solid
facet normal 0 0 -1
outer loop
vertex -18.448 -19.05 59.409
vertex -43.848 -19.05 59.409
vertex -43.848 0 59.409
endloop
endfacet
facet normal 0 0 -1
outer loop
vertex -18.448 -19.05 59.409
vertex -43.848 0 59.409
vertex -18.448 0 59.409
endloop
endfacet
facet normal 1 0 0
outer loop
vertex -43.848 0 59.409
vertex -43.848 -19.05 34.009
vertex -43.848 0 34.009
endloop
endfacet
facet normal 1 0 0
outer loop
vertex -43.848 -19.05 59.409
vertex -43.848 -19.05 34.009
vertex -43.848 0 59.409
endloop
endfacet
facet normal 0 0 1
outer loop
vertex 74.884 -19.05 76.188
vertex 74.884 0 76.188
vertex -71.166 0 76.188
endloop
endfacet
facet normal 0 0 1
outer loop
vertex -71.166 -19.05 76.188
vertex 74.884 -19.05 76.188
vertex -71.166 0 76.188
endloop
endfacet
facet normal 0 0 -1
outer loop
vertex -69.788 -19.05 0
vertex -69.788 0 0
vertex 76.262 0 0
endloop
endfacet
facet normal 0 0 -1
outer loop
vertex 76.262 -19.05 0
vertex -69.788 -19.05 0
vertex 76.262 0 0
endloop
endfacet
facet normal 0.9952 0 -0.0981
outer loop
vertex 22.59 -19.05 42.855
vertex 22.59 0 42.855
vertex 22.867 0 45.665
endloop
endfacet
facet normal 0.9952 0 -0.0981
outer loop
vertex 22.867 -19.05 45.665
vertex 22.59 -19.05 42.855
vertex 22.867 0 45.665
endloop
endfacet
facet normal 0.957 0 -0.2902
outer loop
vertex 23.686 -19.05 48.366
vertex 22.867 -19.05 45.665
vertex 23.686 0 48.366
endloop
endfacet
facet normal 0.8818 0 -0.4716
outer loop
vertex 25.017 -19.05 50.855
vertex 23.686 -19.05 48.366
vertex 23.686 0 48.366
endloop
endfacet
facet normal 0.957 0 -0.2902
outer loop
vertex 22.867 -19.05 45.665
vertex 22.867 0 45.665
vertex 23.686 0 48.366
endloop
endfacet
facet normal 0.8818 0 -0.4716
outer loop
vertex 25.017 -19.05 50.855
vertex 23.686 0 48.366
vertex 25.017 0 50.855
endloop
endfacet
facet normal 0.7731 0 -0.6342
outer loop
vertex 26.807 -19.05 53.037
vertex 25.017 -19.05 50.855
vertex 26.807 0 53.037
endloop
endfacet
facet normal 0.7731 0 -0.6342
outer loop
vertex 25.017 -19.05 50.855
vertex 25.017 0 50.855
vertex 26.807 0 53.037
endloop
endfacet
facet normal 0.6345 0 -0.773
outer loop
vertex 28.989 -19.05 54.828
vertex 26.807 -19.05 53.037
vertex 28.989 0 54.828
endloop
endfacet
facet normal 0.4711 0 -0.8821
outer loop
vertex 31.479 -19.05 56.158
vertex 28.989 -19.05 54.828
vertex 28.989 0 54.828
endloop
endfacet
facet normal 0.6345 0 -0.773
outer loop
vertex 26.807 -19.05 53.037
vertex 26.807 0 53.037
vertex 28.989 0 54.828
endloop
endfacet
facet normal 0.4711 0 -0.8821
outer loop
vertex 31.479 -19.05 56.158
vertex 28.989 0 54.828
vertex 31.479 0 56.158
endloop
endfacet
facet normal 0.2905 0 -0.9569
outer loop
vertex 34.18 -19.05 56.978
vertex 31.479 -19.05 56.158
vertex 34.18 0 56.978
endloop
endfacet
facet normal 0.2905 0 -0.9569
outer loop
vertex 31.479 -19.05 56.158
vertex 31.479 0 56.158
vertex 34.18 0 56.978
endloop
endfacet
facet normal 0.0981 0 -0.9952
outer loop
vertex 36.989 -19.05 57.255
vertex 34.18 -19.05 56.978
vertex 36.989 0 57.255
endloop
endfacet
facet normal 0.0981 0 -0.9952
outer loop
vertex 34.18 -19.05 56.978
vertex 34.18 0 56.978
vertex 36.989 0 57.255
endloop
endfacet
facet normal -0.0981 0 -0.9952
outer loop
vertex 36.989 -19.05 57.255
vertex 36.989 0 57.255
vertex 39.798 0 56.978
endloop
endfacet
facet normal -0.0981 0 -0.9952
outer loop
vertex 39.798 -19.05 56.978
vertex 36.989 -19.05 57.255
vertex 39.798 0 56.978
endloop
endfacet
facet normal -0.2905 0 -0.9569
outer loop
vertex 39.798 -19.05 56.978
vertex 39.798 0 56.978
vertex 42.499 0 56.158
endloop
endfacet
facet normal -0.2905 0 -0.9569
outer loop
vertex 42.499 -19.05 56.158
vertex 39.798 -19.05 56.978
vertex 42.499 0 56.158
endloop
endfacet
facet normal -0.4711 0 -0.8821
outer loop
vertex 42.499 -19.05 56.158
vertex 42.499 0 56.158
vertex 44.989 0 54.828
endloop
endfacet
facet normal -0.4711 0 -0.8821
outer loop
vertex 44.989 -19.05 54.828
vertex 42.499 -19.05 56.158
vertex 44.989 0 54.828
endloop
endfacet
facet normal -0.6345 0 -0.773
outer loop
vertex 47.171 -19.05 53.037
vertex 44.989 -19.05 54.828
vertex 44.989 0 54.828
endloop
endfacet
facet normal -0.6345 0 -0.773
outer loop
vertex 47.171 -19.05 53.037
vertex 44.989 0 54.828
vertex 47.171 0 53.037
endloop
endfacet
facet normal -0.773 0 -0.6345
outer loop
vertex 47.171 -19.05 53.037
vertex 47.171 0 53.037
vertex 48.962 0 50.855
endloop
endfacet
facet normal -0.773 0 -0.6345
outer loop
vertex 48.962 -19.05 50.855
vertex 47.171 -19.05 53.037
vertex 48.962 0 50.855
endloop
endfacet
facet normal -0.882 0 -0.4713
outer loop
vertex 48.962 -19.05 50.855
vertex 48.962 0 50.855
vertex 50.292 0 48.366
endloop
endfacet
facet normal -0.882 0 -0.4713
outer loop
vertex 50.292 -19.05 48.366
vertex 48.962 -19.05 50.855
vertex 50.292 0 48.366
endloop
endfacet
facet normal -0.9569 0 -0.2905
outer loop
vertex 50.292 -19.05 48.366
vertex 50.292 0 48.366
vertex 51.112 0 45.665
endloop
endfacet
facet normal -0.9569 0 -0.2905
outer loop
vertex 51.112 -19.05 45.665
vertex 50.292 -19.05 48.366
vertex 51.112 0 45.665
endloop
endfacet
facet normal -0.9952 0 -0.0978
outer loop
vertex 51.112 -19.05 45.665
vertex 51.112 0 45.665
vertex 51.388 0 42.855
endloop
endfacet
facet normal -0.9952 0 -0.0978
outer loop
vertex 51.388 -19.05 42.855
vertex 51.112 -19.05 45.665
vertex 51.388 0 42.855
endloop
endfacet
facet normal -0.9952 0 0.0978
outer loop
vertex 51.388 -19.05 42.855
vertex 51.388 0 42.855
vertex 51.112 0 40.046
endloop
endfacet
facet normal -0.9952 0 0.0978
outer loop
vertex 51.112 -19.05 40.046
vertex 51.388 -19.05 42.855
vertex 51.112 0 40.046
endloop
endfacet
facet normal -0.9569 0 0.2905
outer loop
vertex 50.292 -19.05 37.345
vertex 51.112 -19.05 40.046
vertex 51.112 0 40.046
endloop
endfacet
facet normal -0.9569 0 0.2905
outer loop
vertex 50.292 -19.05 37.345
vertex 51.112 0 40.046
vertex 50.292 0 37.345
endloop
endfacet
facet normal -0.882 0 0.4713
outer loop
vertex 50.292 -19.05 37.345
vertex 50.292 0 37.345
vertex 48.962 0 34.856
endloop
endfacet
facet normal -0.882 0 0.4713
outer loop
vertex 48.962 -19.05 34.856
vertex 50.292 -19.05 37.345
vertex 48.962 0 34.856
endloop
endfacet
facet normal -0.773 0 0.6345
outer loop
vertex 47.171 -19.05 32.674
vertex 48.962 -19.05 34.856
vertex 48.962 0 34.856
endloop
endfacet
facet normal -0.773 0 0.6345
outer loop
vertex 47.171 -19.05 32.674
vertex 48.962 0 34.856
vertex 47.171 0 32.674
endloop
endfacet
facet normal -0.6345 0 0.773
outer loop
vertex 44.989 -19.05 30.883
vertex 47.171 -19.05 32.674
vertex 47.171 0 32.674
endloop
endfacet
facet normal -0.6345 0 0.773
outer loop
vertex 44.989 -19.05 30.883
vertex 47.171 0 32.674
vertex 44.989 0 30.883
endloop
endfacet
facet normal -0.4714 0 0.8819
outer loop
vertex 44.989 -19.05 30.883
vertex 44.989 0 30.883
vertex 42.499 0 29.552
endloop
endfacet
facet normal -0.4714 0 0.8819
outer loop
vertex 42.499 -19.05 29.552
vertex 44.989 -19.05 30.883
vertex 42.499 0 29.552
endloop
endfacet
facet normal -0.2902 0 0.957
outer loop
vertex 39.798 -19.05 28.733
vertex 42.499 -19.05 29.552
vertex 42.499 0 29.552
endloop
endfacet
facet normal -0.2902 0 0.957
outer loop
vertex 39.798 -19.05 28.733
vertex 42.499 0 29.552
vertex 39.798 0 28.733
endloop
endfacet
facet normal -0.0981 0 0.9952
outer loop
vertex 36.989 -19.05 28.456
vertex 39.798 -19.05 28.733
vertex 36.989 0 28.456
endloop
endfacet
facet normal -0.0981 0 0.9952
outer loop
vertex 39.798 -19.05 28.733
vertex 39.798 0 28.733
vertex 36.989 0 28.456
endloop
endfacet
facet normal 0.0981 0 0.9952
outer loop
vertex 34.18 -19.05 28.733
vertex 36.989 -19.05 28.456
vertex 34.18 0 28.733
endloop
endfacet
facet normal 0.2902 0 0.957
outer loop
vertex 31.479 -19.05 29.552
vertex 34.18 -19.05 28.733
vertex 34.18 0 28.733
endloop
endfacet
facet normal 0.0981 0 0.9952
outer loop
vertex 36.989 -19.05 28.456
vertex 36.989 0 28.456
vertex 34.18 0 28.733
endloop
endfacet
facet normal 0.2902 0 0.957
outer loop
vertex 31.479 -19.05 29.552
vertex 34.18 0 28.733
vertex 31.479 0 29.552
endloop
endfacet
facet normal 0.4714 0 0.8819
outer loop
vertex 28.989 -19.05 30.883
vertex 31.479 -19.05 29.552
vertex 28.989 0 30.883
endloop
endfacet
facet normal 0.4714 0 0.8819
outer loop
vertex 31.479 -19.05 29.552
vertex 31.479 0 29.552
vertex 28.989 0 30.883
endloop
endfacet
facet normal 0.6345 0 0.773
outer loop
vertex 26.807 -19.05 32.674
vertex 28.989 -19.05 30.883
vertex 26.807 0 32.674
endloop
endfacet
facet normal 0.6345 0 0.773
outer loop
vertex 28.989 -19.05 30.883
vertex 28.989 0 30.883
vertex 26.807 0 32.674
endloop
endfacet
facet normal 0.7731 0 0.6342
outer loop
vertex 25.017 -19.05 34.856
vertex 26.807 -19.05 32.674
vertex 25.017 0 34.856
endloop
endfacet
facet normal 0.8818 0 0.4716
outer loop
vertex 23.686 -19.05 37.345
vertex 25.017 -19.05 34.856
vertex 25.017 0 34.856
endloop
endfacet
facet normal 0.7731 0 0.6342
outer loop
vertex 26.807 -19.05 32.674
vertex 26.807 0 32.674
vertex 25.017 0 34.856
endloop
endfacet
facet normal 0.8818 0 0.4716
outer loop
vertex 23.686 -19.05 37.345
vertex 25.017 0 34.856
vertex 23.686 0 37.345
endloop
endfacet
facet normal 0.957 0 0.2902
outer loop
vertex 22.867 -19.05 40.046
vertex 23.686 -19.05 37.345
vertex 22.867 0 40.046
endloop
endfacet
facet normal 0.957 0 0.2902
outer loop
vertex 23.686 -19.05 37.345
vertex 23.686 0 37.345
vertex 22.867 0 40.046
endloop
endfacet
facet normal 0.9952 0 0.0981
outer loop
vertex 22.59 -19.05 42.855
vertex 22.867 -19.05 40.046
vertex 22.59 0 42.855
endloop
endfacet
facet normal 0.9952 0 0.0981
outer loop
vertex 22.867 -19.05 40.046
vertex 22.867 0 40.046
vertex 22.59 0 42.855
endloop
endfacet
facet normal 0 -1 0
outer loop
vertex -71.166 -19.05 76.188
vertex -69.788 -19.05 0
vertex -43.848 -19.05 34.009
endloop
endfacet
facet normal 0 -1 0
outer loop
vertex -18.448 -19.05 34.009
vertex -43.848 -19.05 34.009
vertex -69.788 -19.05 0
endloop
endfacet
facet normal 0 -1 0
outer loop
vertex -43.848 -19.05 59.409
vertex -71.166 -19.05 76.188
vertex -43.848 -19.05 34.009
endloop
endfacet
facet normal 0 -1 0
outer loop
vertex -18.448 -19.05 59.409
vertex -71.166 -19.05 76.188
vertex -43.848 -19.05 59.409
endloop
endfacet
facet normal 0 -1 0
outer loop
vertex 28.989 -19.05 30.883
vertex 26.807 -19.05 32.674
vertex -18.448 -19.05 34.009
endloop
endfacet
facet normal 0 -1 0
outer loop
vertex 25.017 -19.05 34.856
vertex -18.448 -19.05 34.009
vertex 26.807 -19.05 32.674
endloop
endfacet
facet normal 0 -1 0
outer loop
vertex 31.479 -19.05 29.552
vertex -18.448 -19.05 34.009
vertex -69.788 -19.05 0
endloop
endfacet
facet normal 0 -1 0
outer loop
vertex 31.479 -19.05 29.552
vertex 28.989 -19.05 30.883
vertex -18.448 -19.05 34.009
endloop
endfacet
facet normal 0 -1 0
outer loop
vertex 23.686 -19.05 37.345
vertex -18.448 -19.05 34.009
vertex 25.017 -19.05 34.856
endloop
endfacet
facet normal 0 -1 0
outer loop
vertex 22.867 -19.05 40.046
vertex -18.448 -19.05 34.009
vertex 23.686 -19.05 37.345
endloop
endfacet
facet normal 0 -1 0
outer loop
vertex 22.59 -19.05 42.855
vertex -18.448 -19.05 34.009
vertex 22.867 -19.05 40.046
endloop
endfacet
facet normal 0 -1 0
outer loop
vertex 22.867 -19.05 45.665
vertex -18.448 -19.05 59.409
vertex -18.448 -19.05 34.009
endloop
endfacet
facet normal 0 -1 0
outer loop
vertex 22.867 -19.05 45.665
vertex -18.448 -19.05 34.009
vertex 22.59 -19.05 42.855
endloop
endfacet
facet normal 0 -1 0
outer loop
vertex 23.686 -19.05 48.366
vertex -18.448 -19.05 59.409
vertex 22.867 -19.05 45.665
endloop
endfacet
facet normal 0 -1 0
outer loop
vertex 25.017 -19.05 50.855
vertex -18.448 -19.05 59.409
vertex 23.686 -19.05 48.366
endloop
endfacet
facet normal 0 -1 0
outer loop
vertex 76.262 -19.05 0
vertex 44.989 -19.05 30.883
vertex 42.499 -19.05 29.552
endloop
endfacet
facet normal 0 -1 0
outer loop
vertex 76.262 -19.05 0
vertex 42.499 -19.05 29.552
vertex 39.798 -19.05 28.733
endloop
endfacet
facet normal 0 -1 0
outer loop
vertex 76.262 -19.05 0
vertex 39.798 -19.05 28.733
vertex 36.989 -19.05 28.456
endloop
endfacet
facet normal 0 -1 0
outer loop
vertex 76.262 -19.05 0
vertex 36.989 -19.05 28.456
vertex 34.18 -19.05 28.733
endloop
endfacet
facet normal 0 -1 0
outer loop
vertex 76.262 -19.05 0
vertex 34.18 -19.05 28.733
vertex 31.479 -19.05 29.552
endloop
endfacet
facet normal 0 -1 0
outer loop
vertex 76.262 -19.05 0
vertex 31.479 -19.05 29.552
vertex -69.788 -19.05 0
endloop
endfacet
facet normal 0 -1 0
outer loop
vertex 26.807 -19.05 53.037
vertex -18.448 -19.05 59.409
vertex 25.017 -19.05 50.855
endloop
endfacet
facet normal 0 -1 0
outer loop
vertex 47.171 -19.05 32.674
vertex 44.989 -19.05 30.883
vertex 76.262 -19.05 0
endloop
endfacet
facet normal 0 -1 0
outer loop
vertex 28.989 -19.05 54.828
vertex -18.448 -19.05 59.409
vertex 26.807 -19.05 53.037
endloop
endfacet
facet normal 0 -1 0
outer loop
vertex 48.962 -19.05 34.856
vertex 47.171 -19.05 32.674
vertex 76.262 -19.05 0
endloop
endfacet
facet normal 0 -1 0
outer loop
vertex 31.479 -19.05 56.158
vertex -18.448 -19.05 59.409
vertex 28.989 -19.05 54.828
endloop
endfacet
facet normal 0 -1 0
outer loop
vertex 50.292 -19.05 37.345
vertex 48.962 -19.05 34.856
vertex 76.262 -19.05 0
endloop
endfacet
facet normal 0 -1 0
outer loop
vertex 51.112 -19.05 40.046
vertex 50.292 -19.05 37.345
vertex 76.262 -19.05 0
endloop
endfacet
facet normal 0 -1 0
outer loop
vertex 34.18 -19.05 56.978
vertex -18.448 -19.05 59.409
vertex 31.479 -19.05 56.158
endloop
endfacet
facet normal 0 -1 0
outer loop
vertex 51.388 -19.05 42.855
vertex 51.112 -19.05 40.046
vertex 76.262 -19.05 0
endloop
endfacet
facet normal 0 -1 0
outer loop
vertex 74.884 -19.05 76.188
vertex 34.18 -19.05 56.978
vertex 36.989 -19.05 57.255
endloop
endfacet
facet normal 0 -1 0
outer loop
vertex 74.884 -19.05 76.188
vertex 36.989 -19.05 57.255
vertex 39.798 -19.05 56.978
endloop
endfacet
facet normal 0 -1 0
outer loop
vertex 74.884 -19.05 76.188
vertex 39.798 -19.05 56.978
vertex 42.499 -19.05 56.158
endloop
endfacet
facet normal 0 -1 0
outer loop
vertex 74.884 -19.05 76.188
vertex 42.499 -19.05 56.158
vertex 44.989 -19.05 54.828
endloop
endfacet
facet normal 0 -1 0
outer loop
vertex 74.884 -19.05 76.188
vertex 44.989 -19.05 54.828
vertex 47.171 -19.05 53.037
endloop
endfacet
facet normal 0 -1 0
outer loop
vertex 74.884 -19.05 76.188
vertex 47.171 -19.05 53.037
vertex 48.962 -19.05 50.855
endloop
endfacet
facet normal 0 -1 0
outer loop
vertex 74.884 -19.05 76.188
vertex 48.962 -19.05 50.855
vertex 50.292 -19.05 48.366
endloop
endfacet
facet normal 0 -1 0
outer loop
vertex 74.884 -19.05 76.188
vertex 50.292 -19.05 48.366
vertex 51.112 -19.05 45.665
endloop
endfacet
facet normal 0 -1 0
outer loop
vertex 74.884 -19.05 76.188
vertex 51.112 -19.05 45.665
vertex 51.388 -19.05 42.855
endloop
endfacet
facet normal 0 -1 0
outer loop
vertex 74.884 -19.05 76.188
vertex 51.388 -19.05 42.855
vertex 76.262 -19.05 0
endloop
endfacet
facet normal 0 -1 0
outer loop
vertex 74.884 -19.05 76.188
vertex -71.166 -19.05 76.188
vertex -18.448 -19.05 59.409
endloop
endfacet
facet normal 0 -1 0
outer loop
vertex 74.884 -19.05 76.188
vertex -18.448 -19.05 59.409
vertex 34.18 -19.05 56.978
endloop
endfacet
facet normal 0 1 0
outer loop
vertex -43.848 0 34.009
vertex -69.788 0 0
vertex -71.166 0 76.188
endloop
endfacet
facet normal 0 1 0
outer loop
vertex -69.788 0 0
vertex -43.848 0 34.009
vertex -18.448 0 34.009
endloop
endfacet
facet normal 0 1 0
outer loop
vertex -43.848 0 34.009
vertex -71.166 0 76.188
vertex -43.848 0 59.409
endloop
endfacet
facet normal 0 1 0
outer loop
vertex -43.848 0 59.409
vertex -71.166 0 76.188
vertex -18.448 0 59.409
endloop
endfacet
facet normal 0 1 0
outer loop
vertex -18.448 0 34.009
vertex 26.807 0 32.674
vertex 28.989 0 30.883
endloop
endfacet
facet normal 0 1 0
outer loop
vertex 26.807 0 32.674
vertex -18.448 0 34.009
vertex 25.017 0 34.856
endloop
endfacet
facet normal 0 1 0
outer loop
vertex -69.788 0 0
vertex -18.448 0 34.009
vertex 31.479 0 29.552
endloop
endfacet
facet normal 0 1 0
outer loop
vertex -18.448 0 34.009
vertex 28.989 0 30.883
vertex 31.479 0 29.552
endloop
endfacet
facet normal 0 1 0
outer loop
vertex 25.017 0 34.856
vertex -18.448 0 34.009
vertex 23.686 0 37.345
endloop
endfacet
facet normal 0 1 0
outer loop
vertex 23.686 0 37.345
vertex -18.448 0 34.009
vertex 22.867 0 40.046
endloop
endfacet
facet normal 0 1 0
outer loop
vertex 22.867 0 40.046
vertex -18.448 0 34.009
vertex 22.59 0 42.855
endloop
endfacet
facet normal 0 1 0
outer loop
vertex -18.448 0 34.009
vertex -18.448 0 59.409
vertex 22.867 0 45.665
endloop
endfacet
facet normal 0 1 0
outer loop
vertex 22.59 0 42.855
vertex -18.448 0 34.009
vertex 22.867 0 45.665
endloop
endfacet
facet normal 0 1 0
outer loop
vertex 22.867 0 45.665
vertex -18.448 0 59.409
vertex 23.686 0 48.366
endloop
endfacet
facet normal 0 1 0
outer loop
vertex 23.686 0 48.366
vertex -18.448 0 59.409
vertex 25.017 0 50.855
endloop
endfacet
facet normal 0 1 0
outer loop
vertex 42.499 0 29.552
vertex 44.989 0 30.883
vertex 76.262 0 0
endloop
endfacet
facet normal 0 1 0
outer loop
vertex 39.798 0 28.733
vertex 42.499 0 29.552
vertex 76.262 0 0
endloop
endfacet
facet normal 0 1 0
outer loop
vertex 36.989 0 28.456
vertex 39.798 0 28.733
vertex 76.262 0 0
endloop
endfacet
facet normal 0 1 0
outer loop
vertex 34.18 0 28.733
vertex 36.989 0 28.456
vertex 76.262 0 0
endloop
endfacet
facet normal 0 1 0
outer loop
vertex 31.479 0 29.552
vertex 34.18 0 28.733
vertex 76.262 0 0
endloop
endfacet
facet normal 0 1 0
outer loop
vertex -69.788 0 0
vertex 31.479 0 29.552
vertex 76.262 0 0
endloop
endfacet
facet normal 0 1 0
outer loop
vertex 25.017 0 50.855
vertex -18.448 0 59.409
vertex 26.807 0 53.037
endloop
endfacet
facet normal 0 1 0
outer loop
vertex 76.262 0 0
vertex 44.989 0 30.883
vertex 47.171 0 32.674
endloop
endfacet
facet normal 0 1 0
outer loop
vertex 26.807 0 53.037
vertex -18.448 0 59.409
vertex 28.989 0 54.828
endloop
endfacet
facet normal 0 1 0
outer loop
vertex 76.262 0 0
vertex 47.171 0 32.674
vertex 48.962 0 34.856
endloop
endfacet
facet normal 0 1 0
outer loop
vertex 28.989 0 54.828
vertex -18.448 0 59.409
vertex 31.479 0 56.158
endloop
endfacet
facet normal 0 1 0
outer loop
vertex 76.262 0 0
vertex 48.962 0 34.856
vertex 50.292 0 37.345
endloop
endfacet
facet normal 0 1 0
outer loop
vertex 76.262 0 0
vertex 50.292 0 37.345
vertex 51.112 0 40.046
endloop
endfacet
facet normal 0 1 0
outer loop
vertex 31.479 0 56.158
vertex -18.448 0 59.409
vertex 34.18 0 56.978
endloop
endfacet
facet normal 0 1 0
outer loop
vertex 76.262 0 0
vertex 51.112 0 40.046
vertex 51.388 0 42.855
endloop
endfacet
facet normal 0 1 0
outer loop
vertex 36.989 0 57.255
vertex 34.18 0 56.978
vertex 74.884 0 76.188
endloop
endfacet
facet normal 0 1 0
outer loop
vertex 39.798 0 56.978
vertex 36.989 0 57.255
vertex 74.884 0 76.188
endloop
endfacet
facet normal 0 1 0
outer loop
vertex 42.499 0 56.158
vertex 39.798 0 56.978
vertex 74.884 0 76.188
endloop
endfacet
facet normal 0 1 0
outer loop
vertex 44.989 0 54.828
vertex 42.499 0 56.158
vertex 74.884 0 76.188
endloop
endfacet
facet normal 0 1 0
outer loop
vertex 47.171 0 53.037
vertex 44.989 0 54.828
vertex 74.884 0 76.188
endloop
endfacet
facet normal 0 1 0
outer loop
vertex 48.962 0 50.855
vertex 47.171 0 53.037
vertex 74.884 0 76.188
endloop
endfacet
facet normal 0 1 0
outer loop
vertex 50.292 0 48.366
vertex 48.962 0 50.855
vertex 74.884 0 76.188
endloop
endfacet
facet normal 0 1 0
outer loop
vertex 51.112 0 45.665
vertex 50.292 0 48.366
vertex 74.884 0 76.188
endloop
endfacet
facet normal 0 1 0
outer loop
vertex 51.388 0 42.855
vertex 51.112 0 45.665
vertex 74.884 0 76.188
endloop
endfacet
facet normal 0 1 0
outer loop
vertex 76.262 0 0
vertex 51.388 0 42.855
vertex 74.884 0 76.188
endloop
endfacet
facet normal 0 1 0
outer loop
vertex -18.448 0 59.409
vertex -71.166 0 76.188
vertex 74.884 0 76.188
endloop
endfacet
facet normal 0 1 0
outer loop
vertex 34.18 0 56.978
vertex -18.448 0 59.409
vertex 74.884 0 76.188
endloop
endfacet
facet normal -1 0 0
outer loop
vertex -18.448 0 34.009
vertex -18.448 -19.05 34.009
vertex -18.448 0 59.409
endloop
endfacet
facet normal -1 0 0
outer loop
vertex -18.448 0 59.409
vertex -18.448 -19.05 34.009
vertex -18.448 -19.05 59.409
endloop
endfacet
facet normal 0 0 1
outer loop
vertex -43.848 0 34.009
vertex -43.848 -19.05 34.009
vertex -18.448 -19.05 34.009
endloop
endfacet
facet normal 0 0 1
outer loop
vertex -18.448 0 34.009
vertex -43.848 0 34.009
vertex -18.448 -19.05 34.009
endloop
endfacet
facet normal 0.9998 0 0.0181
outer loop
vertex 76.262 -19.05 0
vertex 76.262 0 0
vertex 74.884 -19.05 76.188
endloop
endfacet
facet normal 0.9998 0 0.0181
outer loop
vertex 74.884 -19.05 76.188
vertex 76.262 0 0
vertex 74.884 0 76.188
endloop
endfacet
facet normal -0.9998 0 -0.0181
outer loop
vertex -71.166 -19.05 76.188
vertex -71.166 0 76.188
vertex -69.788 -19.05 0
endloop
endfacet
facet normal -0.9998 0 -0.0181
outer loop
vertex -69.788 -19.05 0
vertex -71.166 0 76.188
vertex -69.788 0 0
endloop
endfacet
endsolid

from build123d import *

# Parameters (mm, degrees)
F1_DEPTH  = 19.05
F2_W      = 25.4
F2_H      = 25.4
F3_DEPTH  = 25.4
F4_R      = 14.3990784814
F1_FACE_W = 25.4
F1_FACE_H = 25.4
F5_DEPTH  = 25.4


with BuildPart() as f1:
    # F0 (on Front) → F1 (new body)
    with BuildSketch(Plane.XZ):
        Polygon((76.2624083042, 0), (74.8843400498, 76.1875378778), (-71.1656599502, 76.1875378778), (-69.7875916958, 0), align=None)
    extrude(amount=F1_DEPTH)

    # F2 (on face) → F3 (cut)
    with BuildSketch(Plane.XZ.offset(19.05)):
        with Locations((-31.1477660805, 46.7091660619)):
            Rectangle(F2_W, F2_H)
    extrude(amount=-F3_DEPTH, mode=Mode.SUBTRACT)

    # F4 (on face) + F1_face (on face) → F5 (cut)
    with BuildSketch(Plane(origin=(0, 0, 0), x_dir=(-1, 0, 0), z_dir=(0, 1, 0))):
        with Locations((-36.9891412556, 42.8554788232)):
            Circle(F4_R)
    with BuildSketch(Plane(origin=(2.548374177, -19.05, 38.0937689389), x_dir=(1, 0, 0), z_dir=(0, -1, 0))):
        Polygon((-73.7140341272, 38.0937689389), (-72.3359658728, -38.0937689389), (73.7140341272, -38.0937689389), (72.3359658728, 38.0937689389), align=None)
        with Locations((-33.6961402575, 8.615397123)):
            Rectangle(F1_FACE_W, F1_FACE_H, mode=Mode.SUBTRACT)
    extrude(amount=-F5_DEPTH, dir=(0, 1, 0), mode=Mode.SUBTRACT)


solid = f1.part
